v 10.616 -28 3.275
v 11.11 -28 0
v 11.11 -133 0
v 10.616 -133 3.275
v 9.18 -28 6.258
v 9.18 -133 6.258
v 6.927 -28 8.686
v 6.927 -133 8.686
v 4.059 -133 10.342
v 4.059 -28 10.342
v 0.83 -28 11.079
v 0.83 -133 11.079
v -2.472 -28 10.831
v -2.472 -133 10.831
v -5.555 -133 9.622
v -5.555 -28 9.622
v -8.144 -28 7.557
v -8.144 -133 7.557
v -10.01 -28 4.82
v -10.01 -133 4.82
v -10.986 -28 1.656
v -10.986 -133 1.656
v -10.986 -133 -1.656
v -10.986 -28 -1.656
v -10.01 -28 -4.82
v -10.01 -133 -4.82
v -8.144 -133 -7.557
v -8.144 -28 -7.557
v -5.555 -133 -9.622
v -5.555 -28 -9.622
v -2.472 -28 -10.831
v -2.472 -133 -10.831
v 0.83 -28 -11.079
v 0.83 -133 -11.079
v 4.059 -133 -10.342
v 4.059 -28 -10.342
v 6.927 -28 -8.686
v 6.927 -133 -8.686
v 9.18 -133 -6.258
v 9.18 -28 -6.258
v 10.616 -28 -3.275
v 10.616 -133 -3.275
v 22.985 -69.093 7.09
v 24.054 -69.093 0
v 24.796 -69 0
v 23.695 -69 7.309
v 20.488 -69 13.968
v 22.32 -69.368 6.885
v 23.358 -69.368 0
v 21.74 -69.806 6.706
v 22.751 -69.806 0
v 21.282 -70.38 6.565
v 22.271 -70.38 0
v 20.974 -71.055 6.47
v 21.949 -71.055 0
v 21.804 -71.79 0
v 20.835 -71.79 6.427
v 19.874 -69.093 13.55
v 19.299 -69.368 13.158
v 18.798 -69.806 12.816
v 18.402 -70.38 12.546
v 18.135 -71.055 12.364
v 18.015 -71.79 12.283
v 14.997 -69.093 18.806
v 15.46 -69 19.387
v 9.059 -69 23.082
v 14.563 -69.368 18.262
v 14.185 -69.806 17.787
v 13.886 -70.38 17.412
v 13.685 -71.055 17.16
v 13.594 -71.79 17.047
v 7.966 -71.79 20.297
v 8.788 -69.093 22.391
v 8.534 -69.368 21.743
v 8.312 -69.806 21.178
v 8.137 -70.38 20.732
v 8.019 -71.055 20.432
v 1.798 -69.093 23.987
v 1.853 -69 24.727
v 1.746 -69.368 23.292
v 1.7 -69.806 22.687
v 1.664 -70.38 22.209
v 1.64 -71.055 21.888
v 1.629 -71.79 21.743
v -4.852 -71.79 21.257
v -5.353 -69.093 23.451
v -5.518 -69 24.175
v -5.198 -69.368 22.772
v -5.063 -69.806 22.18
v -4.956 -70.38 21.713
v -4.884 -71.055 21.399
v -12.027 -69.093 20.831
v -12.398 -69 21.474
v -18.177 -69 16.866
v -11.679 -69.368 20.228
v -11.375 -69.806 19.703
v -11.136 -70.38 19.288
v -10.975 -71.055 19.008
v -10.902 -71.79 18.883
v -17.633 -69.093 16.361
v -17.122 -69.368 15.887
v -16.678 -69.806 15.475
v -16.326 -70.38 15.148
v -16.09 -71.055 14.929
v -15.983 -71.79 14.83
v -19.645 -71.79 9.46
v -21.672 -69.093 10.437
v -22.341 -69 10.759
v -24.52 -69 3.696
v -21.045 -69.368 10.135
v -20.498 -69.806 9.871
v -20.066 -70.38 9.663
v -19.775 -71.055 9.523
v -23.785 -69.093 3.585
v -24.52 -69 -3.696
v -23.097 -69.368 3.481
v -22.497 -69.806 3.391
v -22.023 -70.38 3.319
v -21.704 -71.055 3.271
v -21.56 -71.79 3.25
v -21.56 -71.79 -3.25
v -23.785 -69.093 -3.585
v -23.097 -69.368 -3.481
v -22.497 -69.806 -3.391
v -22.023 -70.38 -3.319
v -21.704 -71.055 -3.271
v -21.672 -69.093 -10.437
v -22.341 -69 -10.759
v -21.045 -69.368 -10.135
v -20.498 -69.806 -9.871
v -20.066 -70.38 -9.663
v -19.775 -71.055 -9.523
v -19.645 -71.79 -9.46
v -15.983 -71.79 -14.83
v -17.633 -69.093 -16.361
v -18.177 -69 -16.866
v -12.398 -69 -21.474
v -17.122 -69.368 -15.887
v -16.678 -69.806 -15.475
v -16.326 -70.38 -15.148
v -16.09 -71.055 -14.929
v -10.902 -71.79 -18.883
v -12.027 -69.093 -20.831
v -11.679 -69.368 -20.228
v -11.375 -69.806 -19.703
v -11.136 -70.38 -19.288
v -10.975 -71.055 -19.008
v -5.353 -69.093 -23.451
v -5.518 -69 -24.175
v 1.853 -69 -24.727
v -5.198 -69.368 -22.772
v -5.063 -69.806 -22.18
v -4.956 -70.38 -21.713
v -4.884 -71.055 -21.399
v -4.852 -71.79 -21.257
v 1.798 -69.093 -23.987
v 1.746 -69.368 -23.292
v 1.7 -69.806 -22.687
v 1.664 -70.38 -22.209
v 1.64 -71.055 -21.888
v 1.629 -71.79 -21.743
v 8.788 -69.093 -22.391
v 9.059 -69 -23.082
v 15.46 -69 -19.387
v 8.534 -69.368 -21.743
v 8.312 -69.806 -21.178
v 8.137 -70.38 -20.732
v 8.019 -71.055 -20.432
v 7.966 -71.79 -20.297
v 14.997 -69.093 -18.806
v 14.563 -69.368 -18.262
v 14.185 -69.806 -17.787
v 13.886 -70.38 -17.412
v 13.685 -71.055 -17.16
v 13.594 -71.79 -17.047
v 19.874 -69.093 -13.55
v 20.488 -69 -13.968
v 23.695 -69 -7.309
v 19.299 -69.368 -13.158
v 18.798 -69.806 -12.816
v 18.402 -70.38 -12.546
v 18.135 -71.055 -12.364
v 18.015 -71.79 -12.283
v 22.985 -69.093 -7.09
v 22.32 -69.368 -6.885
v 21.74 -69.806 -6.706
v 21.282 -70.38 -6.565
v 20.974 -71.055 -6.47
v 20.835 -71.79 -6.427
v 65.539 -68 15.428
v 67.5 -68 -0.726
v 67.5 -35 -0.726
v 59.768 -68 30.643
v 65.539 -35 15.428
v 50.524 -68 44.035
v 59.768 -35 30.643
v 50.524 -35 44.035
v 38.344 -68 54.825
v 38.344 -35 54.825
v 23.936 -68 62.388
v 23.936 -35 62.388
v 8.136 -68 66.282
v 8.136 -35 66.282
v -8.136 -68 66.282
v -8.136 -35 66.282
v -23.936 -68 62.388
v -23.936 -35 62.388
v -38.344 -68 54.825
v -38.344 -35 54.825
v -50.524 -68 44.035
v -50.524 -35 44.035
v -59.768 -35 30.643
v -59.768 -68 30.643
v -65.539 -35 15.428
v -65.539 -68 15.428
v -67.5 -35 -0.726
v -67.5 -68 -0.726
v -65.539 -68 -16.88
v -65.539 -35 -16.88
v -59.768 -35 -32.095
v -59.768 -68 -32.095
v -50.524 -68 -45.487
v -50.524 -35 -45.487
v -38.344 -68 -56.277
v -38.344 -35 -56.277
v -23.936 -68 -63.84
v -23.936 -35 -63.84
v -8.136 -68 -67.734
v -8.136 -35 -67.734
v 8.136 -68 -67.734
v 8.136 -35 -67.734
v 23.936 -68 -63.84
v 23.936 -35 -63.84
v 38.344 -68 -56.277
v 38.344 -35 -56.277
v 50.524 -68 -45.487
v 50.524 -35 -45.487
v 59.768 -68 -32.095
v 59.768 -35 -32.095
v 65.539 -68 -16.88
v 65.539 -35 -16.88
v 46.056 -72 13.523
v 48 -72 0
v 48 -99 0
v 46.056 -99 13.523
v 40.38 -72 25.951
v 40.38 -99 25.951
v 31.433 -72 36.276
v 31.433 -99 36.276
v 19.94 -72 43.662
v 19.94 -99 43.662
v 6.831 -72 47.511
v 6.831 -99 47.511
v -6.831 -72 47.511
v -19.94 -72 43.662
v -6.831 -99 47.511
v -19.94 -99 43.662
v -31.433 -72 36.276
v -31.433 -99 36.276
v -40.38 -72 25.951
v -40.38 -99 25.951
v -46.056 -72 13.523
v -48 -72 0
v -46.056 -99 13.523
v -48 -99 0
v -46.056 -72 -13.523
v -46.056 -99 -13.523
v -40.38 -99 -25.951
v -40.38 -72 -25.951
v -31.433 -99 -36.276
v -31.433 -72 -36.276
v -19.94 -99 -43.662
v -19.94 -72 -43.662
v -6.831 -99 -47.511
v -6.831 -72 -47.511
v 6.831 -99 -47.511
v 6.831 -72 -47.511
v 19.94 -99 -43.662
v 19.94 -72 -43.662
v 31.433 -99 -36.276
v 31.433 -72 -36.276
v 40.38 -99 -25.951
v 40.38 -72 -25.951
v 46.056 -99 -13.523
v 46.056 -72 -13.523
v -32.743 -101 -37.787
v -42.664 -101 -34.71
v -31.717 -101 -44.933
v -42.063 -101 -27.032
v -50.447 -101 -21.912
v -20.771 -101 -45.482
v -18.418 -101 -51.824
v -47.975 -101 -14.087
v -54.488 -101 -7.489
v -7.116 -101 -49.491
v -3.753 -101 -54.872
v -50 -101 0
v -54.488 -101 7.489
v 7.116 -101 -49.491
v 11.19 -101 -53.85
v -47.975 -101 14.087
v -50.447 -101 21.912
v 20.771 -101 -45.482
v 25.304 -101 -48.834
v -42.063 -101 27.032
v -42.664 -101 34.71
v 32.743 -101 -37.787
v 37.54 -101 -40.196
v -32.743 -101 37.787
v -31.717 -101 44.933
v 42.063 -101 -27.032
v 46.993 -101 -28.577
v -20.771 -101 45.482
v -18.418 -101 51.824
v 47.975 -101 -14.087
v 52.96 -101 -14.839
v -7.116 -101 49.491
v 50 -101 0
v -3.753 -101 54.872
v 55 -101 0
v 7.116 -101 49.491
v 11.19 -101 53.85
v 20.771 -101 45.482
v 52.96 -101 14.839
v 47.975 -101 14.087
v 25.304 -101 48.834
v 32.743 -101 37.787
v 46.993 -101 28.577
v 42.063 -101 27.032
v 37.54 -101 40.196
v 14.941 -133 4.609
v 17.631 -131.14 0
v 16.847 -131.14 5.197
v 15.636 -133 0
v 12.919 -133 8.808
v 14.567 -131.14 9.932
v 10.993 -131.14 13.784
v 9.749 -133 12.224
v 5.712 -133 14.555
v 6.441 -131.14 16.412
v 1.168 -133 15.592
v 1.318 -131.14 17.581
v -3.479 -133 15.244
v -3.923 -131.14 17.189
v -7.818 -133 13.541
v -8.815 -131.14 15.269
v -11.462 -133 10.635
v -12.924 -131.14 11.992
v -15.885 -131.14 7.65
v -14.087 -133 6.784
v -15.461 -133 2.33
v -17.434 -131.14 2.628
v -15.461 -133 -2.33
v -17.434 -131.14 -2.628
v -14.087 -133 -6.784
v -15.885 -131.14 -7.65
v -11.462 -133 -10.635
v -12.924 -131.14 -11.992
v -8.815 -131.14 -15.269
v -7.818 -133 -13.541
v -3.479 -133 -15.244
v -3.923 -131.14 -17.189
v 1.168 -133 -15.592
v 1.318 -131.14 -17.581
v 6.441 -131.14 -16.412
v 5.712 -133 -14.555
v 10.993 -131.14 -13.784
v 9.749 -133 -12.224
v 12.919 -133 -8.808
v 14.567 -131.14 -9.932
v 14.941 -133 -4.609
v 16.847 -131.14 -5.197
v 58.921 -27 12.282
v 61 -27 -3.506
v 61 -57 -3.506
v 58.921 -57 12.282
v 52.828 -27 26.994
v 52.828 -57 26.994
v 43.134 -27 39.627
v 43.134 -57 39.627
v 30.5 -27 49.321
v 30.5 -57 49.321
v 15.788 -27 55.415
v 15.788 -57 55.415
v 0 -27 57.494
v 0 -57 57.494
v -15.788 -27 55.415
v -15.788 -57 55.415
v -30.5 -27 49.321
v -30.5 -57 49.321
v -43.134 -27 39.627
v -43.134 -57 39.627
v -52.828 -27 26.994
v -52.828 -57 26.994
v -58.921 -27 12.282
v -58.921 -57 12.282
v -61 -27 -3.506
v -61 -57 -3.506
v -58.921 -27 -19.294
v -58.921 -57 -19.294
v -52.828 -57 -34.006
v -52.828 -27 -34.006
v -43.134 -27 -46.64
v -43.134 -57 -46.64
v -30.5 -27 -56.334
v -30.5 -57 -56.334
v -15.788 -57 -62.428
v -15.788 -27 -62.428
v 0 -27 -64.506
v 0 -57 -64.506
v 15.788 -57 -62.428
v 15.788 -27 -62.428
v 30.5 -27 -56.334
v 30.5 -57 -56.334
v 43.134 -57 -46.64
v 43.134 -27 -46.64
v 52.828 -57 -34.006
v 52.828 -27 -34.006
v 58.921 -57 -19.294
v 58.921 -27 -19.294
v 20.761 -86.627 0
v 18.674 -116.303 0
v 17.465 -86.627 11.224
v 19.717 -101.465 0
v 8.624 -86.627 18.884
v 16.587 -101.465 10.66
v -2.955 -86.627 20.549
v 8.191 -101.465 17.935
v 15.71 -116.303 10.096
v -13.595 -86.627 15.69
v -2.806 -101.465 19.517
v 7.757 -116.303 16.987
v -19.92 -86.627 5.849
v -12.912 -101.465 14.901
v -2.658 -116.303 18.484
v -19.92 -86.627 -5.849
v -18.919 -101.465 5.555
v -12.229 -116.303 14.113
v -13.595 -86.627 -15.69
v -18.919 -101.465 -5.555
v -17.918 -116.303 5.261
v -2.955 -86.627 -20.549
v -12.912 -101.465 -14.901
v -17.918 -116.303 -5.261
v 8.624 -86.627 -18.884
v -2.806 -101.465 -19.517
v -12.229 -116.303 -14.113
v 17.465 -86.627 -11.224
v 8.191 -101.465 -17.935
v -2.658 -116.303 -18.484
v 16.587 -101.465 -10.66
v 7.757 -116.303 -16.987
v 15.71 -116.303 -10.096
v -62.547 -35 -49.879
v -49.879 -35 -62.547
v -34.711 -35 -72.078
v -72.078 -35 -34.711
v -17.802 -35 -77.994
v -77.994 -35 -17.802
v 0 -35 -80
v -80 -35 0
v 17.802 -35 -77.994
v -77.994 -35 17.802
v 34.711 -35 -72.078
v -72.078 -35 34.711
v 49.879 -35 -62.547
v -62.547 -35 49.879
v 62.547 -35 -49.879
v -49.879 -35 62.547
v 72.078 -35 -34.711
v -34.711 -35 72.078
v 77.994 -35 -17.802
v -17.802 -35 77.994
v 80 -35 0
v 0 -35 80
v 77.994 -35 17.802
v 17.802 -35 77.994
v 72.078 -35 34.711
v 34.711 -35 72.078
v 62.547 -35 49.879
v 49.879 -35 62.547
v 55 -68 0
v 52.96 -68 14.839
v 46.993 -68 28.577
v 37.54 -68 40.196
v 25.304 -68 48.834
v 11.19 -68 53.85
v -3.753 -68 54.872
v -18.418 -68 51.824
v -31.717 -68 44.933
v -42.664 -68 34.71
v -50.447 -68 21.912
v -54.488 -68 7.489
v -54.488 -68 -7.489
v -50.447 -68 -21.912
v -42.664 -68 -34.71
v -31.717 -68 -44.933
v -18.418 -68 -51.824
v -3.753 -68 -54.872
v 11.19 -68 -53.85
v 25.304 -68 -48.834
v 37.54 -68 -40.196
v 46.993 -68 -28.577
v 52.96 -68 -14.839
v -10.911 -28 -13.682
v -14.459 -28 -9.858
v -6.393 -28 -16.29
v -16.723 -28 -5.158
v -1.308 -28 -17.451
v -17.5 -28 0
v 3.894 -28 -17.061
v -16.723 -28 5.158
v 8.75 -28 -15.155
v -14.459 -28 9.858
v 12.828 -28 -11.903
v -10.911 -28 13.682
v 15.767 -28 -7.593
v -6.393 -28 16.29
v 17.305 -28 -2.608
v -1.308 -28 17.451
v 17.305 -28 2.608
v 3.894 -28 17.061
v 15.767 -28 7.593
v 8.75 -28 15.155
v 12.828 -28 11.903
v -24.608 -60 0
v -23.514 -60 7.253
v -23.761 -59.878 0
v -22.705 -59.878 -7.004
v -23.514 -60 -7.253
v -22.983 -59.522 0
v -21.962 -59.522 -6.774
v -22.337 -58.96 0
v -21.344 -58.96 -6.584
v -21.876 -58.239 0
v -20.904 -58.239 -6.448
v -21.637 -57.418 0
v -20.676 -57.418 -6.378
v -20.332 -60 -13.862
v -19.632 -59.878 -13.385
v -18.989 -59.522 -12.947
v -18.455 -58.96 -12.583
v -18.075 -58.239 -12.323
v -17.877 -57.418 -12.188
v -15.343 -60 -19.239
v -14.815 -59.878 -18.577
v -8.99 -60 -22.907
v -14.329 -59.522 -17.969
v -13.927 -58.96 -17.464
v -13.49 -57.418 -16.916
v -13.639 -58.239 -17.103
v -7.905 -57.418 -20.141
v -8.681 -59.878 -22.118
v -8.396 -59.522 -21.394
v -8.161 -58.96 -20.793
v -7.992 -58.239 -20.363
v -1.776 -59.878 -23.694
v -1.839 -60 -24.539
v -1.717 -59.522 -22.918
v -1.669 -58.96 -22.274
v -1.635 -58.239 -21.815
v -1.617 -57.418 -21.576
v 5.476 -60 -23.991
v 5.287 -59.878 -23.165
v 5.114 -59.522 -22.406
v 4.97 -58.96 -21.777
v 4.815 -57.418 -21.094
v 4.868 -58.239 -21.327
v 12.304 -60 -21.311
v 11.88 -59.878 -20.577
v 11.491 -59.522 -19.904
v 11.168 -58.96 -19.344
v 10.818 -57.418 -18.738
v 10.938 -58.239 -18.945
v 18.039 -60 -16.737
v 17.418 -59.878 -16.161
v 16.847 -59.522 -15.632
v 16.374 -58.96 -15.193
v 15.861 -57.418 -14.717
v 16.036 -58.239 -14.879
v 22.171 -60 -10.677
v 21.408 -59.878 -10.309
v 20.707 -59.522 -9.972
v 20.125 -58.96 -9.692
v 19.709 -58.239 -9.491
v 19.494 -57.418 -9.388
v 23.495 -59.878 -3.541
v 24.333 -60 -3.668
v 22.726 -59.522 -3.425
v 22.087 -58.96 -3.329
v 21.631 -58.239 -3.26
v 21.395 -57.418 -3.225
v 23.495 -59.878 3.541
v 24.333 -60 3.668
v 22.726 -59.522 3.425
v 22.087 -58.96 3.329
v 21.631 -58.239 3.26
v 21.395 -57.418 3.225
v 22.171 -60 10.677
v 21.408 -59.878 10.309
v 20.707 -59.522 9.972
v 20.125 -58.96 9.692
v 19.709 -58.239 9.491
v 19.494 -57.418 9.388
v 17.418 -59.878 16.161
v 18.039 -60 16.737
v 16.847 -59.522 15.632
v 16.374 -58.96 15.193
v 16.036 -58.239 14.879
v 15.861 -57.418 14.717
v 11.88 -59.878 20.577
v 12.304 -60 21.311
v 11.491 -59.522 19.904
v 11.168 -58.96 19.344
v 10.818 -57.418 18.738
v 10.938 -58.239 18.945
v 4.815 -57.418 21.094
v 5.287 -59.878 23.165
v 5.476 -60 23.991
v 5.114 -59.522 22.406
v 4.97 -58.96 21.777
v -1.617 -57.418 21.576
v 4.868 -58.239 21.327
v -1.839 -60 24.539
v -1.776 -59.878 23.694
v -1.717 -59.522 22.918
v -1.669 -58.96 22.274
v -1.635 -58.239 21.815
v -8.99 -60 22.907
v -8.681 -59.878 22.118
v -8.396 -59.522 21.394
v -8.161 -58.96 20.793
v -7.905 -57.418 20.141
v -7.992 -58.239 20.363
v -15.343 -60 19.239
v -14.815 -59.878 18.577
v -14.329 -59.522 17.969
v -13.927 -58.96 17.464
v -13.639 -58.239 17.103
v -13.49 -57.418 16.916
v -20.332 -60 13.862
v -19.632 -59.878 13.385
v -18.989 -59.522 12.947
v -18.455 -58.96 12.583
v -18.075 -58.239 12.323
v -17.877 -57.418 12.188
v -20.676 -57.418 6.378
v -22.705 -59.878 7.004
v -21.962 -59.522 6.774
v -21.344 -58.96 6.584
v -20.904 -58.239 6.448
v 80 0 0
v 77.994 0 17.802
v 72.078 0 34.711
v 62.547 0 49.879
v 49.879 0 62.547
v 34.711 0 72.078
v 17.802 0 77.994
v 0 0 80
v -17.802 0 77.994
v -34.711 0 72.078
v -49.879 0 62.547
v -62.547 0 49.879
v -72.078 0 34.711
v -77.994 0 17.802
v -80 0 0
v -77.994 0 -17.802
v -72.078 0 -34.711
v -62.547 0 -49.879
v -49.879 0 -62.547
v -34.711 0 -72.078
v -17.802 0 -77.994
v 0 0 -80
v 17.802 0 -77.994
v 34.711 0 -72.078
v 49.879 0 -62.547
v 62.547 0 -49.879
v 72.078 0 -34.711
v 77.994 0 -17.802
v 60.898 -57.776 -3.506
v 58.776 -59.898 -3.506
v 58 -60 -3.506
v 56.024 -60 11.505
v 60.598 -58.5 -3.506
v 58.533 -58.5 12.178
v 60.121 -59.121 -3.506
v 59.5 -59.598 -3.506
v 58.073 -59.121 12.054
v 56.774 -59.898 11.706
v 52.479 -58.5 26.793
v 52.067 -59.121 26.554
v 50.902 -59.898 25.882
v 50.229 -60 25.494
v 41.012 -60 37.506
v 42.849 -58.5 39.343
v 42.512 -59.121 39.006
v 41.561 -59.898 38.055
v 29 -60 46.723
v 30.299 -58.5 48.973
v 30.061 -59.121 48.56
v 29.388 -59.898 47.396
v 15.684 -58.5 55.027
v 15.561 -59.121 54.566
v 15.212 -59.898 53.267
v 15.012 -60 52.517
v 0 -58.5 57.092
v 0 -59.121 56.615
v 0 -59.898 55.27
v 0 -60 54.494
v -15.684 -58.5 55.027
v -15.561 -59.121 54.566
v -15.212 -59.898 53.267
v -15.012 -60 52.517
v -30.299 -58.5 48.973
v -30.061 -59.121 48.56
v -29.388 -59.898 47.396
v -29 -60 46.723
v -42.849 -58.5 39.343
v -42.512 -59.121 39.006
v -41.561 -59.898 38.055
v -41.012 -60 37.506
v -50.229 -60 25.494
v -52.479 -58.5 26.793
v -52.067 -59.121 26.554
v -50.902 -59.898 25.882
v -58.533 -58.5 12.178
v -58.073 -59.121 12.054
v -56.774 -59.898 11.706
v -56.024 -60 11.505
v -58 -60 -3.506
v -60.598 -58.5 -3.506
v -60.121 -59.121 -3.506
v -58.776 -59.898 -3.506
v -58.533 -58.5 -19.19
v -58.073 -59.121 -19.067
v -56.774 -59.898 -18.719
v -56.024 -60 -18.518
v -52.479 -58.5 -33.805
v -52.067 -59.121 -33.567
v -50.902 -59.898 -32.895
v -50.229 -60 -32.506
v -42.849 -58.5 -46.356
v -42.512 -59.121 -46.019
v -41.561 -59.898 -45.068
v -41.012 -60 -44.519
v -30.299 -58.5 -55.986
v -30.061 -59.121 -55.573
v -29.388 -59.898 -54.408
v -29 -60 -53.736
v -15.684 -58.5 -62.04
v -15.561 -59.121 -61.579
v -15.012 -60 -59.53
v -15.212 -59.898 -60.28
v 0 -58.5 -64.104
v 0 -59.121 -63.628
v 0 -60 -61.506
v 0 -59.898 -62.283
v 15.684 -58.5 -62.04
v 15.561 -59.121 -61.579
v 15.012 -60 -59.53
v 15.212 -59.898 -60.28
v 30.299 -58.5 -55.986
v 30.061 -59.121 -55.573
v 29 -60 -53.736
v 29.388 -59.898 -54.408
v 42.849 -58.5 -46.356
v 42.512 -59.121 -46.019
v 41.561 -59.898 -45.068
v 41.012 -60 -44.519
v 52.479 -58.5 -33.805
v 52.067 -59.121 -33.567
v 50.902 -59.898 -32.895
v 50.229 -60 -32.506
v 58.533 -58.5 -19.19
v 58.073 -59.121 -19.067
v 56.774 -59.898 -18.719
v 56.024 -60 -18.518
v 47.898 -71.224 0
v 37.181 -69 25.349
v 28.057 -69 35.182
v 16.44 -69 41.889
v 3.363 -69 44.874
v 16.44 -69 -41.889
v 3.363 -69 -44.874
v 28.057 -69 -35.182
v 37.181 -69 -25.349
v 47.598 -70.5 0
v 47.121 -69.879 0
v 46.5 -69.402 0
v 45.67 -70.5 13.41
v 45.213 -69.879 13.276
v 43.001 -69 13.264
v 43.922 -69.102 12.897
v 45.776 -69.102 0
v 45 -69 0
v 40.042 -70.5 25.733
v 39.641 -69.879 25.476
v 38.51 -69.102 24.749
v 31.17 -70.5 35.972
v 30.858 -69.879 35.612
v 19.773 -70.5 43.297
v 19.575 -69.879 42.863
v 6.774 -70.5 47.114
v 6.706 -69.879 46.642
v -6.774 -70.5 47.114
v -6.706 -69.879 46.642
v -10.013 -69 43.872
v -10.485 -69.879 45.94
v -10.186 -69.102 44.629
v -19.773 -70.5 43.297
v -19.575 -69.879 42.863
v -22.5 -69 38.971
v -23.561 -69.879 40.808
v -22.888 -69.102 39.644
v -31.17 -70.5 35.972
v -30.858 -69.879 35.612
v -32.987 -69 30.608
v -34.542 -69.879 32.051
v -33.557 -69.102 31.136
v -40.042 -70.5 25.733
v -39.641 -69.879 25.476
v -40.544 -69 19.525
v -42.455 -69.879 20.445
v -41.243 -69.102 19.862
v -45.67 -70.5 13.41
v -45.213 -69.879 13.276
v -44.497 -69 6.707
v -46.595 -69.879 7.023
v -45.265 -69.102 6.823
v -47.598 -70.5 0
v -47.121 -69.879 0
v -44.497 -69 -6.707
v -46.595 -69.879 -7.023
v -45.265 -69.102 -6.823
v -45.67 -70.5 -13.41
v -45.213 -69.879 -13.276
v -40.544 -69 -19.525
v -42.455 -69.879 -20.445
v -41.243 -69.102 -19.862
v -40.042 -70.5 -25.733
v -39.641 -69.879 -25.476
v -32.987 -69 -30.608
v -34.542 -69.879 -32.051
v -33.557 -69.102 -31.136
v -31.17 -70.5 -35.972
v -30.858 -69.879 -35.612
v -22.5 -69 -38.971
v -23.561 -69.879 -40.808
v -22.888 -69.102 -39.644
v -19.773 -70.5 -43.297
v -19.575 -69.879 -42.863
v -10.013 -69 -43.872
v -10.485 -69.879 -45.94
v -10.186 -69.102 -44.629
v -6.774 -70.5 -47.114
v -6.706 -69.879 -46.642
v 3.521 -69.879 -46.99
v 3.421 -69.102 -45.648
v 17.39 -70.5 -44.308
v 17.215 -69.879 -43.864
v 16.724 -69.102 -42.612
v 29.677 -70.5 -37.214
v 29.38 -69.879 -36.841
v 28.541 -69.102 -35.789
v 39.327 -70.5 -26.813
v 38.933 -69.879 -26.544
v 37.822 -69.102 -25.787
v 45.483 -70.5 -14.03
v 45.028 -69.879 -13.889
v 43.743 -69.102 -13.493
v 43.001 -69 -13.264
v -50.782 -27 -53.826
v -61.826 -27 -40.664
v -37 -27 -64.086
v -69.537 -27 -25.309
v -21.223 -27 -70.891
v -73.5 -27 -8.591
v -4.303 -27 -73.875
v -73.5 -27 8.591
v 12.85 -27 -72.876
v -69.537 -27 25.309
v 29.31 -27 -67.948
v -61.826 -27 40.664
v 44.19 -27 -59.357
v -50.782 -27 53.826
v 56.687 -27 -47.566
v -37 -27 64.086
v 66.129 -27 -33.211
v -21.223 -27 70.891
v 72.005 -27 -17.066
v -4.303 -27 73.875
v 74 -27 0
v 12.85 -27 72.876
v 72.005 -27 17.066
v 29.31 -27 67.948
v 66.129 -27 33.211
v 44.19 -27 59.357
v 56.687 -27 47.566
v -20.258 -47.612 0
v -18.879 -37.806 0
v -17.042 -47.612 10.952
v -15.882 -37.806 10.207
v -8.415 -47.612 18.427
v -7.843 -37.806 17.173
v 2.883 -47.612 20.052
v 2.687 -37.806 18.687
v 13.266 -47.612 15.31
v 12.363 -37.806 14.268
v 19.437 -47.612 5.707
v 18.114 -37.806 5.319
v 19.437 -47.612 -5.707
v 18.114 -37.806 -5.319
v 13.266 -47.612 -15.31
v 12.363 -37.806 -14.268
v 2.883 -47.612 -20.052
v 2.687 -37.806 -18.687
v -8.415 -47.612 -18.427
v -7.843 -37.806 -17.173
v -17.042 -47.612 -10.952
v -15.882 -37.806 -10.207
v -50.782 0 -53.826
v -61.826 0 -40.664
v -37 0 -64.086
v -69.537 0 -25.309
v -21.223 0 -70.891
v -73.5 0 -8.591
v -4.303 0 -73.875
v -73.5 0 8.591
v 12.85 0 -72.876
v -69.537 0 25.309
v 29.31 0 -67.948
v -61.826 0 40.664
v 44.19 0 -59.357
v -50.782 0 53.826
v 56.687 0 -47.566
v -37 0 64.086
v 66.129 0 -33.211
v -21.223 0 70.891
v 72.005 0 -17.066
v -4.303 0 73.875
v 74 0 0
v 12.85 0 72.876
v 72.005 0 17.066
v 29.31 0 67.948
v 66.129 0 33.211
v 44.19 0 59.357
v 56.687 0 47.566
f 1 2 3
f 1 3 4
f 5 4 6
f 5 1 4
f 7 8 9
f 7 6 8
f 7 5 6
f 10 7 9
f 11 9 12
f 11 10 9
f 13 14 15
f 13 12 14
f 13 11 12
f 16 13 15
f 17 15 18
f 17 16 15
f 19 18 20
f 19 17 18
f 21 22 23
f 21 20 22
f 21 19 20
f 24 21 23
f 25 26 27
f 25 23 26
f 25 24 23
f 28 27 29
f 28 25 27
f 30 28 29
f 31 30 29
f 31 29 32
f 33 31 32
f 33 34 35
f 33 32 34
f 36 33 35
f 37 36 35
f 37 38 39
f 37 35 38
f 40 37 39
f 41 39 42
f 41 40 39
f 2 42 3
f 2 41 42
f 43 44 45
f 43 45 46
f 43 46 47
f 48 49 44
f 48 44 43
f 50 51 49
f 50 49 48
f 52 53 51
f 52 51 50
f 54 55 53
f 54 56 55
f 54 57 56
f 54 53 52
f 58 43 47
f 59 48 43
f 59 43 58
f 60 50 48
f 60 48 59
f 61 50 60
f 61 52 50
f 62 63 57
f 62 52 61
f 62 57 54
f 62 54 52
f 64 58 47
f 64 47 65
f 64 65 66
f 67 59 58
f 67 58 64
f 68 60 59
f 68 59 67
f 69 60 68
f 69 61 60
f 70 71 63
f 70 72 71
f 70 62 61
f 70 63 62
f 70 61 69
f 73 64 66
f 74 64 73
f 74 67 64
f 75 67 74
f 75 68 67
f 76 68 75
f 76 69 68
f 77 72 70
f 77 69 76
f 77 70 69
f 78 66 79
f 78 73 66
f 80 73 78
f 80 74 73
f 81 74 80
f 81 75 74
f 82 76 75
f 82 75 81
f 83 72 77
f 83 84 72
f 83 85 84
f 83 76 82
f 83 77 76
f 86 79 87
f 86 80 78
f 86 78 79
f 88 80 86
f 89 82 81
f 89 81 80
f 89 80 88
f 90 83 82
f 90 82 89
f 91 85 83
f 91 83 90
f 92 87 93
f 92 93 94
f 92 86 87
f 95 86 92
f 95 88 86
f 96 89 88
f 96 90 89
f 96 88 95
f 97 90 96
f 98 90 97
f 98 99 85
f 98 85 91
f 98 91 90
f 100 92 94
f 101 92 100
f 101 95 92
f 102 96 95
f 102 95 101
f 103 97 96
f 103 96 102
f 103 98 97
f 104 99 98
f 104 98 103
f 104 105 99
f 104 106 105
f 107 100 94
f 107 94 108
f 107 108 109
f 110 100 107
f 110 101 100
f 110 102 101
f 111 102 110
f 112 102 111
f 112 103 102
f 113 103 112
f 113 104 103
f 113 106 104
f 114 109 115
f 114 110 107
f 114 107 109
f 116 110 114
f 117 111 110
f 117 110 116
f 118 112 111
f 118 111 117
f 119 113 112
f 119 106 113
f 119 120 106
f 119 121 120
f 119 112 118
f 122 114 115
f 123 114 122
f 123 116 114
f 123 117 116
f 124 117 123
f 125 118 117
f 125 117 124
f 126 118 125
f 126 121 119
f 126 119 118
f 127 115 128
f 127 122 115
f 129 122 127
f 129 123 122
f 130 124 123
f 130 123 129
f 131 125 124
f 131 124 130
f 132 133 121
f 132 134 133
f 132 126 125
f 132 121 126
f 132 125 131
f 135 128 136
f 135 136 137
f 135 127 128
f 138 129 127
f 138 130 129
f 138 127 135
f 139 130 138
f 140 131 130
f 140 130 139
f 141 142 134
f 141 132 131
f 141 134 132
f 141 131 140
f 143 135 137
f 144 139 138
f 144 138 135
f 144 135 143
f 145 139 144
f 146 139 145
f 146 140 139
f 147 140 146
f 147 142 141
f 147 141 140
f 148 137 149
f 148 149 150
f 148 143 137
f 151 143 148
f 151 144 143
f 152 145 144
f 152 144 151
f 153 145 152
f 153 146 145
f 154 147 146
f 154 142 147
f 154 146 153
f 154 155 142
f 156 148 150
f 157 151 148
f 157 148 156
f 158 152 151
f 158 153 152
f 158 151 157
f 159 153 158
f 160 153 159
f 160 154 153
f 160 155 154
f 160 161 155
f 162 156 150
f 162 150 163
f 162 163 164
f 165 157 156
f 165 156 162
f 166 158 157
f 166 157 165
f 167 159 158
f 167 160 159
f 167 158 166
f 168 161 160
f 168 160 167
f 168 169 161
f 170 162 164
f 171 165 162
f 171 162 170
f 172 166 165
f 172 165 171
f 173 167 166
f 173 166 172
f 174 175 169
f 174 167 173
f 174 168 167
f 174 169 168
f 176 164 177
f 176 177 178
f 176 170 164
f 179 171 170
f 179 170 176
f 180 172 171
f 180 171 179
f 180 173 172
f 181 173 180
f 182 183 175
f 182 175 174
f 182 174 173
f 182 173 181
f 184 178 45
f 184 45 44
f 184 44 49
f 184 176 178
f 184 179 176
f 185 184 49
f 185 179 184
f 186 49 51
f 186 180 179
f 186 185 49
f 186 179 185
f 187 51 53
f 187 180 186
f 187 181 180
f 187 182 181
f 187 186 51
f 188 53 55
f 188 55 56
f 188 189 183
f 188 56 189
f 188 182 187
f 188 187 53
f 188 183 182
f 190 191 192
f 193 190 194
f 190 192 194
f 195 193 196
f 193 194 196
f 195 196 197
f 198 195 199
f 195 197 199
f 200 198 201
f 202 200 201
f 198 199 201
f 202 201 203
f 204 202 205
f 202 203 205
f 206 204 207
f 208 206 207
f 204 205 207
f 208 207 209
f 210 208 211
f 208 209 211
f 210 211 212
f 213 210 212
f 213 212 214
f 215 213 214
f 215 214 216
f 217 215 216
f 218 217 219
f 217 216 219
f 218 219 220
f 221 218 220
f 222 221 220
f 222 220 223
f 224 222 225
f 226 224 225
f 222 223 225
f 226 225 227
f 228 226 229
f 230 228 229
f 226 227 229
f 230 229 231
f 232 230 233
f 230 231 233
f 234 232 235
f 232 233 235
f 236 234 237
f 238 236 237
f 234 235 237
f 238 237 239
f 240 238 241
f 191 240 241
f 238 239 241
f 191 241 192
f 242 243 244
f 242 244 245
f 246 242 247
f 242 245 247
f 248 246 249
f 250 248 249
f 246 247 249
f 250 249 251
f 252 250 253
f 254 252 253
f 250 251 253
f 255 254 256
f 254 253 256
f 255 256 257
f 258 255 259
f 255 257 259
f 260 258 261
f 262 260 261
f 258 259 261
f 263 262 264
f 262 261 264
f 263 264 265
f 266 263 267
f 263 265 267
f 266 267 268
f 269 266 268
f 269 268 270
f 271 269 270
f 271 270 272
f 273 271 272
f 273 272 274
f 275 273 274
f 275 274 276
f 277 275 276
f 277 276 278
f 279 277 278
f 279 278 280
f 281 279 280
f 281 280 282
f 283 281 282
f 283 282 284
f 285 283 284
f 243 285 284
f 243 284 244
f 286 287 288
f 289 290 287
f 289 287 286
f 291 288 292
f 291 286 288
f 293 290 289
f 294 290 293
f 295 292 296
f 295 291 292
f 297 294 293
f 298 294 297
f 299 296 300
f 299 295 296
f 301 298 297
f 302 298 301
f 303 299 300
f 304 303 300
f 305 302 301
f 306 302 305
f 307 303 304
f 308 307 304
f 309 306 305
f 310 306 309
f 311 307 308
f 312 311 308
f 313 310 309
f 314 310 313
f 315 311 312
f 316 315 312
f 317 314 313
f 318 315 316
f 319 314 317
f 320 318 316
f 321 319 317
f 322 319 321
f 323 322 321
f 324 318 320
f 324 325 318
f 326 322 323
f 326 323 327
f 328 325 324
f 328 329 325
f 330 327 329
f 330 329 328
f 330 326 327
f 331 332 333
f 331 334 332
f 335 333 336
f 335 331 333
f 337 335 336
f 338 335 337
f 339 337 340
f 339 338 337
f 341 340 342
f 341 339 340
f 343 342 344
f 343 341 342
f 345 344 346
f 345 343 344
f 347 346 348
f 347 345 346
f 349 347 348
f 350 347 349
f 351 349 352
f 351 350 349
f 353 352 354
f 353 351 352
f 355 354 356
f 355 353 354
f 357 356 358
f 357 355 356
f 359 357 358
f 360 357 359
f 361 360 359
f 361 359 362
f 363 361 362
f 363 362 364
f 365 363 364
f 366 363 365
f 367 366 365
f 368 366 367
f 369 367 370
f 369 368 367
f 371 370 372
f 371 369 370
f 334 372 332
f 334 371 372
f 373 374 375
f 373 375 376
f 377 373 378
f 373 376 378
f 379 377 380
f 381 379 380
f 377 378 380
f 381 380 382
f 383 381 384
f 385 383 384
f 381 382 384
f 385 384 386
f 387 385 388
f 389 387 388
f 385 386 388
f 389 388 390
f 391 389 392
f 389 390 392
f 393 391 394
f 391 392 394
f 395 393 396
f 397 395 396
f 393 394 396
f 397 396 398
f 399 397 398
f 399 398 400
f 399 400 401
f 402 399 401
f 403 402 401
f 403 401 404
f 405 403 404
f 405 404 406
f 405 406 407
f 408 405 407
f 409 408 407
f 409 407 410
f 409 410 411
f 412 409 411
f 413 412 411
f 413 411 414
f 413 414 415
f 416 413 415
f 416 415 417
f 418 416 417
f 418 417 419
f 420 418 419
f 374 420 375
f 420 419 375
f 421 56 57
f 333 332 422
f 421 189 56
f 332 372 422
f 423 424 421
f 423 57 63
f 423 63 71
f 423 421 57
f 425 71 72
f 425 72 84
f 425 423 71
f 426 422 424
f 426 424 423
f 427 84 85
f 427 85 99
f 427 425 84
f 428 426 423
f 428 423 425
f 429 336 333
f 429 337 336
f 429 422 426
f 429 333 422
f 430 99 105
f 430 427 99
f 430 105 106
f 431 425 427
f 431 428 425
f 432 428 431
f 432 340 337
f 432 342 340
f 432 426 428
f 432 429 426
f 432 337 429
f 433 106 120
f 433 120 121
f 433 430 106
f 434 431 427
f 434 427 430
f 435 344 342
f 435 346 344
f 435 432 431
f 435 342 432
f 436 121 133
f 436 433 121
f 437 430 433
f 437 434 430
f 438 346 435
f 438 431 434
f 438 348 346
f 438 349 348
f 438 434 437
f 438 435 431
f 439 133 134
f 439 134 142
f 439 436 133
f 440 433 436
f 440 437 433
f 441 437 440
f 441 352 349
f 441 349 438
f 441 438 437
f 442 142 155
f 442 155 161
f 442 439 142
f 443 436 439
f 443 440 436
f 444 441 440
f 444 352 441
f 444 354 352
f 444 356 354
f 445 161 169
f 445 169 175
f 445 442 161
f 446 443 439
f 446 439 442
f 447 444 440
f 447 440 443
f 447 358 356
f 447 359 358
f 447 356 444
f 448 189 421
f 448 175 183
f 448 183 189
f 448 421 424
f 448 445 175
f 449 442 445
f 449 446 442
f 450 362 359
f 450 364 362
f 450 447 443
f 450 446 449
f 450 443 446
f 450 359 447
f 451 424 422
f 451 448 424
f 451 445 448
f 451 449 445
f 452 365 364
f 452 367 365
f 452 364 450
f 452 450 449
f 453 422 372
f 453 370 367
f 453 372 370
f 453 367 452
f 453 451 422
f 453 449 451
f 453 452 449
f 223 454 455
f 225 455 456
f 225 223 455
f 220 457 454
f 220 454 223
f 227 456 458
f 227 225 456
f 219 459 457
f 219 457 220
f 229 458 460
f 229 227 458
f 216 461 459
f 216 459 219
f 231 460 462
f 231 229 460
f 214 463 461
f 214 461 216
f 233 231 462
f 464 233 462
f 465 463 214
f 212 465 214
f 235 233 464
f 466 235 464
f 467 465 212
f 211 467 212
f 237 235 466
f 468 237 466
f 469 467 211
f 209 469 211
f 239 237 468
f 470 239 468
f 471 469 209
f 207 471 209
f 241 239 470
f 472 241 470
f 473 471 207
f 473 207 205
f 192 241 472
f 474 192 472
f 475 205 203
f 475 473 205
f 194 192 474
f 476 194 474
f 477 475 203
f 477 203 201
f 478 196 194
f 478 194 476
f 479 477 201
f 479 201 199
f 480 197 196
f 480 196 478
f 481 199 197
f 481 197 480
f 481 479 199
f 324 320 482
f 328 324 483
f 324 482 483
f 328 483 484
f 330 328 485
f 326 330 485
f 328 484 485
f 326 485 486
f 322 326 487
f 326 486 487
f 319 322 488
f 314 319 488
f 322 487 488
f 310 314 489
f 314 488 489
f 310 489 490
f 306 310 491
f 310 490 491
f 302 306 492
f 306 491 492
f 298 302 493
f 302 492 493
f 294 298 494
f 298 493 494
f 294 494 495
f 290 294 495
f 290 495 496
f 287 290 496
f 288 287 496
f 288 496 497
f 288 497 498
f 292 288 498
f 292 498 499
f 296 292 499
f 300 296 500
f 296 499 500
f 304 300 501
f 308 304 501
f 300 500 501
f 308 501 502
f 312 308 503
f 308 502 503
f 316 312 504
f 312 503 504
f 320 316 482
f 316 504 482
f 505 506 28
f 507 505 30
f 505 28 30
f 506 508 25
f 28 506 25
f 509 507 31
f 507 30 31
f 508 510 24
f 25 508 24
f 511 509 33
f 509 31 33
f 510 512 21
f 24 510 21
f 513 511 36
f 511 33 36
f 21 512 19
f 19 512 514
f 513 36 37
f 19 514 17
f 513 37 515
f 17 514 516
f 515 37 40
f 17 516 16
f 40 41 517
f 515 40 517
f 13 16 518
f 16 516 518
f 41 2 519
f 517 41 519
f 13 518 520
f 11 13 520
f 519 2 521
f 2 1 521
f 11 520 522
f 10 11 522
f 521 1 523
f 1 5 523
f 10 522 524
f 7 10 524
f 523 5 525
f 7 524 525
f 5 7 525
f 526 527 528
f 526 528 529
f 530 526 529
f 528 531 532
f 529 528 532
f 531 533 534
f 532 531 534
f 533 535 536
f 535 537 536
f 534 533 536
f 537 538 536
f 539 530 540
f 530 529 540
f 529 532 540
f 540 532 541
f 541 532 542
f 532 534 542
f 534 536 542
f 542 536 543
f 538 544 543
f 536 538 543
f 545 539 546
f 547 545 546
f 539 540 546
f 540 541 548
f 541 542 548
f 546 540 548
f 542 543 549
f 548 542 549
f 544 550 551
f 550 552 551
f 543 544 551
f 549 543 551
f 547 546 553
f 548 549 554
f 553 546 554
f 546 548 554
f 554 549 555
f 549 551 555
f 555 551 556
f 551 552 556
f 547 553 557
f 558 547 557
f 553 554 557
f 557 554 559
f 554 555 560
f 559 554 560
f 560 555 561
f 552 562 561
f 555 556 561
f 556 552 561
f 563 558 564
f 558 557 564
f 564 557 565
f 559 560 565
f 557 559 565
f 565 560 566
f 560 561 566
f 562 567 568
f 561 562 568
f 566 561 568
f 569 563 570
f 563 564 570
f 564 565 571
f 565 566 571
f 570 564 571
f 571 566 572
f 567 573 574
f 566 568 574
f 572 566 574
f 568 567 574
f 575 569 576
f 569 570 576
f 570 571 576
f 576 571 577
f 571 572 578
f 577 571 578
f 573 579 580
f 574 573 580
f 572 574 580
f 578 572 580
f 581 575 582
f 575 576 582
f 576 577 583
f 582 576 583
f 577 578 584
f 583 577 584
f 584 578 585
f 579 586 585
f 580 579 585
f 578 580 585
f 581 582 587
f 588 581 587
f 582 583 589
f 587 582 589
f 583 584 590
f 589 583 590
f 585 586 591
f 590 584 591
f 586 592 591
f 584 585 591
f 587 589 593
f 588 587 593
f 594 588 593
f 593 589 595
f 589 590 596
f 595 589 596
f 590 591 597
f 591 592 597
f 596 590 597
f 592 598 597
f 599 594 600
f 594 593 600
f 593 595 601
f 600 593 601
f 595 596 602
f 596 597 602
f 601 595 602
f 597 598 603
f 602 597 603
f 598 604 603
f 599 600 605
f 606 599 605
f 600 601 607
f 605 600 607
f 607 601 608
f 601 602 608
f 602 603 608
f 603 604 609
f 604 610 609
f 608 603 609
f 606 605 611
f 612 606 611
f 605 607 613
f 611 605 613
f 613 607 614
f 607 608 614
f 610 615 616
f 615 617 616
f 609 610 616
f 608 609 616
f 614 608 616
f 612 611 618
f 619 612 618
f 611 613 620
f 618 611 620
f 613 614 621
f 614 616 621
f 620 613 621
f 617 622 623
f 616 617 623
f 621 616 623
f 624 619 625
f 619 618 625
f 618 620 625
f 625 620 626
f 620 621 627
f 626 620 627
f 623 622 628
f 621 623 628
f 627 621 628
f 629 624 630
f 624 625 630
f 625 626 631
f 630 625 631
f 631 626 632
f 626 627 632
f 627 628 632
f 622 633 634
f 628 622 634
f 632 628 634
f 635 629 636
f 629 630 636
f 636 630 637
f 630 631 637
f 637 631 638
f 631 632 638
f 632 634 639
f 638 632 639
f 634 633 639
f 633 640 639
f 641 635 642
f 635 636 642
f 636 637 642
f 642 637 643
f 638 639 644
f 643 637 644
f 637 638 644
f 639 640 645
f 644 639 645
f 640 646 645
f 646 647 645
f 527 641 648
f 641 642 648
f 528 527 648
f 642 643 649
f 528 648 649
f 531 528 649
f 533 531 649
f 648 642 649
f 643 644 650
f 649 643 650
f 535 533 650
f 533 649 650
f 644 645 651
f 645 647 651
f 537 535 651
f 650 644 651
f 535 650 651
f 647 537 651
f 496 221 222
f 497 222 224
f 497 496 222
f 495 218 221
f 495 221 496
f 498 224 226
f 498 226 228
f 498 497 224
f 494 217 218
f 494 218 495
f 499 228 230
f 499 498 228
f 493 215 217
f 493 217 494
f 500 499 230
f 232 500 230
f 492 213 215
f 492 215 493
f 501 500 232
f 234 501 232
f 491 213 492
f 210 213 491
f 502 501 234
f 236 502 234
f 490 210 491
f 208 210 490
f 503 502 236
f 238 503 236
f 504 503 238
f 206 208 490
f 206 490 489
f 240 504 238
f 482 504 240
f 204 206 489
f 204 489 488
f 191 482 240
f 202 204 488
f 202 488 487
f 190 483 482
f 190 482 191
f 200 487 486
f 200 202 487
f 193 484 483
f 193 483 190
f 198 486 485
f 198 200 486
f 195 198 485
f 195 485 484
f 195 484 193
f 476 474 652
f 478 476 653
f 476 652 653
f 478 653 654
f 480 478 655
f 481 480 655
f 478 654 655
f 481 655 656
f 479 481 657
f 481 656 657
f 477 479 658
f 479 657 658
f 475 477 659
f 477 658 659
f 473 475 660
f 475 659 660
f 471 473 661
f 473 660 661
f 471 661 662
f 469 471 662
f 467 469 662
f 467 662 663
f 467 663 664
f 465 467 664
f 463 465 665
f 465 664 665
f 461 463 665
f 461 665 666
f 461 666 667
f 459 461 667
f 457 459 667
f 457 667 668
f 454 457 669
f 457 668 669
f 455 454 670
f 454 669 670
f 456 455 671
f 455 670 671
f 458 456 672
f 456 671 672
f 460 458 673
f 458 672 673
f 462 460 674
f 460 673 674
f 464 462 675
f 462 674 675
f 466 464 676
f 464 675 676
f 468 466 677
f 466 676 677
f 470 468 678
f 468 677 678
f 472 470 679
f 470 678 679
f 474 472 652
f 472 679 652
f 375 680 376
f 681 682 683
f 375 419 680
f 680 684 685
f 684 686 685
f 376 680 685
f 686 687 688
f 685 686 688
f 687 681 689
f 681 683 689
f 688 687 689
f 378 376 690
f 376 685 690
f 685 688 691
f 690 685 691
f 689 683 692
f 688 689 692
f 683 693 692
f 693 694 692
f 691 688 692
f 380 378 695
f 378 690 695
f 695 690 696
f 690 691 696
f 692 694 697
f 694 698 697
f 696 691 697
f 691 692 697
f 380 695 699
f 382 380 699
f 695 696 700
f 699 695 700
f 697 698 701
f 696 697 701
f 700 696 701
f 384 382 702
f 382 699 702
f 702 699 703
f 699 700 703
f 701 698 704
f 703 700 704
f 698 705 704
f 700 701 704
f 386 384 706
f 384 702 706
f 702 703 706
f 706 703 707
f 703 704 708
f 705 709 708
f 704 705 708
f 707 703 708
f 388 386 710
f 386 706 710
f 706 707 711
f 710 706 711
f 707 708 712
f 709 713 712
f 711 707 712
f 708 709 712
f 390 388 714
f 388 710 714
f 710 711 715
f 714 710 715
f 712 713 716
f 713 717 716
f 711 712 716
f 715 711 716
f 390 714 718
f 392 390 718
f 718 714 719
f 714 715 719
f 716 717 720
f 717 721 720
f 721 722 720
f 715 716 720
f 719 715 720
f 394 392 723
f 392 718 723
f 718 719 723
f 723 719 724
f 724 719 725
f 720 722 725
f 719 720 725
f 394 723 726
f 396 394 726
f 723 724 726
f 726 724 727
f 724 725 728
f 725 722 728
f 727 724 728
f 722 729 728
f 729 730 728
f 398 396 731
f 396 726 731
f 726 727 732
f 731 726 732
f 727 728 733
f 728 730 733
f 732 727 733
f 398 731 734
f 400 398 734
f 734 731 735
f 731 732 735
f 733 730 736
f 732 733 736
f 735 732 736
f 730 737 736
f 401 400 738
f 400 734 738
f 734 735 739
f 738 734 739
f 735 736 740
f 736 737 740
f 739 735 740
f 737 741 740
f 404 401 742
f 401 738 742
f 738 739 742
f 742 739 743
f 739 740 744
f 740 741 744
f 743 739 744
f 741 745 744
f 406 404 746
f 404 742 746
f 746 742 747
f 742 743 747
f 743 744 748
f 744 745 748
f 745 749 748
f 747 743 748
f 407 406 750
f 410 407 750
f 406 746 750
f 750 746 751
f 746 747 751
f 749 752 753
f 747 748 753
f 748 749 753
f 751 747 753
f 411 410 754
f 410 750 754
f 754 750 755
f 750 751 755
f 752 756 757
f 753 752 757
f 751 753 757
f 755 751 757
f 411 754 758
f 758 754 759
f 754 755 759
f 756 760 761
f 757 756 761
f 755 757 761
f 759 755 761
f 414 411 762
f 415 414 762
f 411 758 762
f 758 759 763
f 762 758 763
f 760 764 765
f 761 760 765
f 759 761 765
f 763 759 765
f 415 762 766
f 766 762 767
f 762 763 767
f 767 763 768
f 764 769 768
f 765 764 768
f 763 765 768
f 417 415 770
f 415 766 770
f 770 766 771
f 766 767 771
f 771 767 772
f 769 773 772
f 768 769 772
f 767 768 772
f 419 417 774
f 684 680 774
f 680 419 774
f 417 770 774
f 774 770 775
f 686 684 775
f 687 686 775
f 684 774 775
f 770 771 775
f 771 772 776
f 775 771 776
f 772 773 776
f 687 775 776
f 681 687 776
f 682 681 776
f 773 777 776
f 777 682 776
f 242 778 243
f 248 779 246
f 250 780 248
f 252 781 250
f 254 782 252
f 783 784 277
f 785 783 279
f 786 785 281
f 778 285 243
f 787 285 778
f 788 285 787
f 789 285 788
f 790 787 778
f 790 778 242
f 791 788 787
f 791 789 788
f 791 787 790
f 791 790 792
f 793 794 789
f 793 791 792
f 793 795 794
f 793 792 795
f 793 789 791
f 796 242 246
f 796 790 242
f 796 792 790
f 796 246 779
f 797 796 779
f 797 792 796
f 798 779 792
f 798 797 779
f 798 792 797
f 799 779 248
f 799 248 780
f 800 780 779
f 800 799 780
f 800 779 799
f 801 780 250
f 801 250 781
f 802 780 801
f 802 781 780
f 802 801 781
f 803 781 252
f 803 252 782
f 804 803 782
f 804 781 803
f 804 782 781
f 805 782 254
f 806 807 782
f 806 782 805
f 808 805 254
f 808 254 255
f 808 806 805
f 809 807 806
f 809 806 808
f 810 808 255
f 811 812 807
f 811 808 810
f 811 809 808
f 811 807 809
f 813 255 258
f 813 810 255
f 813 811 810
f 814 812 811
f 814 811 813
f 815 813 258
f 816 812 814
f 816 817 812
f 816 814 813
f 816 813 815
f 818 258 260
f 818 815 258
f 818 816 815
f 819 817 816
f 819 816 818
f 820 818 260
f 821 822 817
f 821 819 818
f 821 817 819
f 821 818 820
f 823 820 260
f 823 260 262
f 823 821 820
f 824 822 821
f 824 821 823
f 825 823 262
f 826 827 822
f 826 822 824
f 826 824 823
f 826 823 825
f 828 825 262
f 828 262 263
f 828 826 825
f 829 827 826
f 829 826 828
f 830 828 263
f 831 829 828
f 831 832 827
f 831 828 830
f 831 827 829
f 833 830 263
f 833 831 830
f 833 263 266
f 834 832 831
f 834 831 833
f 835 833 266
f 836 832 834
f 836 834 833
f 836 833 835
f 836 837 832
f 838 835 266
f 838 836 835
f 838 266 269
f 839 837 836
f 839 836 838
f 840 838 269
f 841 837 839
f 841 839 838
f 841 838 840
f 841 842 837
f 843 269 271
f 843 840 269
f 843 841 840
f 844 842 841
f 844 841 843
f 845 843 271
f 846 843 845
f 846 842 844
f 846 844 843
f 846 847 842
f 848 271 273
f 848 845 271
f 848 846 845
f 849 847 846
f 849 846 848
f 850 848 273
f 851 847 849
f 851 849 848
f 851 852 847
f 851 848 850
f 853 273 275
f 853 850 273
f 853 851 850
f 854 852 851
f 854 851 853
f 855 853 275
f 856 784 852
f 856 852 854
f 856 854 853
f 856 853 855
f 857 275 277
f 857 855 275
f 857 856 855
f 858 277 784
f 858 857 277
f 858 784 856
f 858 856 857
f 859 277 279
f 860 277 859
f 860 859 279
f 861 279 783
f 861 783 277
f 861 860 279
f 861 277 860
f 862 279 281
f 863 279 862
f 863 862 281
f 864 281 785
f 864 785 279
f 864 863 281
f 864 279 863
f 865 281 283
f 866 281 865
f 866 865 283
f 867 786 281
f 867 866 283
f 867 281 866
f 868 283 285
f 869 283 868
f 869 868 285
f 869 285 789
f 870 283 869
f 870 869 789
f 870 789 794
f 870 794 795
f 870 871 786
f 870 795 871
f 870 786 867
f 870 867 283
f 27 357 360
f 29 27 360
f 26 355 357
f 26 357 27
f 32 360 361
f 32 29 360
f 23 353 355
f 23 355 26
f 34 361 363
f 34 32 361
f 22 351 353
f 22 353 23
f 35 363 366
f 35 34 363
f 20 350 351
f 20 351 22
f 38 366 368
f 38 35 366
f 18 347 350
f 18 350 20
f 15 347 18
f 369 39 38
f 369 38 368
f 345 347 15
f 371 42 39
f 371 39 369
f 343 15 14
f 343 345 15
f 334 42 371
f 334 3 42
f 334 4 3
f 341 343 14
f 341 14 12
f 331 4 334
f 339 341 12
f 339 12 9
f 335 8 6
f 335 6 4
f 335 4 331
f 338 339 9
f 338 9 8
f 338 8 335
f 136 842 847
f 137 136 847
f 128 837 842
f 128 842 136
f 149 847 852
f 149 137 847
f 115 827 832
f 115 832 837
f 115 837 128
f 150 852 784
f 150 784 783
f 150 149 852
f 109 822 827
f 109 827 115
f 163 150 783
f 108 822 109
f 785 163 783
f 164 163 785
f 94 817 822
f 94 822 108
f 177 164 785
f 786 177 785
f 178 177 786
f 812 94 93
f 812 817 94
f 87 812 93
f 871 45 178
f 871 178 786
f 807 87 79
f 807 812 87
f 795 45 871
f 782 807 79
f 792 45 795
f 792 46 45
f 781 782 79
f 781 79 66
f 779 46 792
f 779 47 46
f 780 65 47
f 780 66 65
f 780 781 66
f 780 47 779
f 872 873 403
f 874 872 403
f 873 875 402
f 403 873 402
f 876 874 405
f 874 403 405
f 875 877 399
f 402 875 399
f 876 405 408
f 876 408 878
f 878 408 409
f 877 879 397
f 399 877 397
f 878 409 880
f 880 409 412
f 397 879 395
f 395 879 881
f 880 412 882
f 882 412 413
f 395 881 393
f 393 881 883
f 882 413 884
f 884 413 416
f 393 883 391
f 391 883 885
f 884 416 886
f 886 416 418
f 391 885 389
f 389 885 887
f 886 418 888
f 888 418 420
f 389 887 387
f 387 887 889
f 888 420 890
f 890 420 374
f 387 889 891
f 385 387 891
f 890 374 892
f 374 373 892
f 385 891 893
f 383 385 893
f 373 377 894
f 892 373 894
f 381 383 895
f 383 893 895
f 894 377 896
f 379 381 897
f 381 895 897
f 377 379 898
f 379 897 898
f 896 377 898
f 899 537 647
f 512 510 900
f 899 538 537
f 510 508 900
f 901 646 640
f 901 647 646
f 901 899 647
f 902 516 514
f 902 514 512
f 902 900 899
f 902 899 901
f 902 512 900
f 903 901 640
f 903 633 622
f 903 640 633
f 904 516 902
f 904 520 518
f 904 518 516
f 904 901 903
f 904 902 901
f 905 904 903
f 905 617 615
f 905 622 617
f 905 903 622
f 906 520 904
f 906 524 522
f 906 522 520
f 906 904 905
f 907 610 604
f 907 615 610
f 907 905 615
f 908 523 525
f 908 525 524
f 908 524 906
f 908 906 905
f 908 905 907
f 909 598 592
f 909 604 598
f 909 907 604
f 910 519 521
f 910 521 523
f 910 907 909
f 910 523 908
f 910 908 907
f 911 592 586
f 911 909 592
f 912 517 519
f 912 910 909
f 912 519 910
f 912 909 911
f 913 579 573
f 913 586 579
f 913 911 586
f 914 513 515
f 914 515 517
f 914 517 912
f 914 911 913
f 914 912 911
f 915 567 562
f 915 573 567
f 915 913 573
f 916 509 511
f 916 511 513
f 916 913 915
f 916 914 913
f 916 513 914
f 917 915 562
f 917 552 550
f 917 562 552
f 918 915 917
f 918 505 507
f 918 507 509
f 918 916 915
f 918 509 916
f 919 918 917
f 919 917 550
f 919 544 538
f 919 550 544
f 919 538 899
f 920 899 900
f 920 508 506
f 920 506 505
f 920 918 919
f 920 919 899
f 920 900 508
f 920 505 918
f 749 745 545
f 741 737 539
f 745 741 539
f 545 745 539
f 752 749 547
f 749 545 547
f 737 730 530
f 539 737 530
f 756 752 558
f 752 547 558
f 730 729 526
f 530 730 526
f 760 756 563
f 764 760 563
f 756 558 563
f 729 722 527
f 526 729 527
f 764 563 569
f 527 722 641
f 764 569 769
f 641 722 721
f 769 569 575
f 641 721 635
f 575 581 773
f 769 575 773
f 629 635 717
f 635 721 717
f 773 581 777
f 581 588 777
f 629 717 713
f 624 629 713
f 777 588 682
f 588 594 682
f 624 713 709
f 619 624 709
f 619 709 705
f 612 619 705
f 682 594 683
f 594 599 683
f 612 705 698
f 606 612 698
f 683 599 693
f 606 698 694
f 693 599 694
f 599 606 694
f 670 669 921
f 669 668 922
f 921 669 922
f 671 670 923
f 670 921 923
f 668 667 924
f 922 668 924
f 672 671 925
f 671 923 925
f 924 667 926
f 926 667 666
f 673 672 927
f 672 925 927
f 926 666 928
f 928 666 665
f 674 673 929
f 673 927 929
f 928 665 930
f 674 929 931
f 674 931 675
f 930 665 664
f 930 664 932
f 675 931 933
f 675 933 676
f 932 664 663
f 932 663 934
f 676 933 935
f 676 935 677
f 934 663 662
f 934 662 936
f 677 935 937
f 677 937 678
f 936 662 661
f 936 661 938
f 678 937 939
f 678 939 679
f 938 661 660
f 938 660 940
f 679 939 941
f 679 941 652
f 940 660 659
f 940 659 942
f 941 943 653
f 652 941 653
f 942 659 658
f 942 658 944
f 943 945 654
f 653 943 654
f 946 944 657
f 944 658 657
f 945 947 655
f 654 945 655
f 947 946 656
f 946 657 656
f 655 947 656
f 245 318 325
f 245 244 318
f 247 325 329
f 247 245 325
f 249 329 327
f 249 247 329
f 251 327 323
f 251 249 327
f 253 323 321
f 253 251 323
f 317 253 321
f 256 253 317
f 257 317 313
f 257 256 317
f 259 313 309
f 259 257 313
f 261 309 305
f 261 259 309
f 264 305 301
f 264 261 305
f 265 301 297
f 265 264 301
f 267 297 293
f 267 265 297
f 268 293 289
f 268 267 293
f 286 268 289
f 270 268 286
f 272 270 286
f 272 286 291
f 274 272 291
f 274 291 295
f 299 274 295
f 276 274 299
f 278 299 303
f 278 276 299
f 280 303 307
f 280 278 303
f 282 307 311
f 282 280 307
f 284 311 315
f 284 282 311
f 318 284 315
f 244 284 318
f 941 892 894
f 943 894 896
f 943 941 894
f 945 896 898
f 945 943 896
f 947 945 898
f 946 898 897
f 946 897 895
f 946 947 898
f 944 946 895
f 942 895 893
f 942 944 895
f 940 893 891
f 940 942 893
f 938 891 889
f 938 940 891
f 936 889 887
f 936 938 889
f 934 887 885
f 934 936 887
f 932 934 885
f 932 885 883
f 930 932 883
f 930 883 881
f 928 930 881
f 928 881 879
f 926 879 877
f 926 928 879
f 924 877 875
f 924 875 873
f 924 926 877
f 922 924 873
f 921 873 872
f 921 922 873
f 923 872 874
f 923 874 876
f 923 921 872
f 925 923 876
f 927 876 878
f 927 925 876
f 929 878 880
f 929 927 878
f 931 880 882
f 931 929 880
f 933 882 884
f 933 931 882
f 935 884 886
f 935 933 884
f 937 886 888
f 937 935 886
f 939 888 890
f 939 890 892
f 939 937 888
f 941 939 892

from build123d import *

# Parameters (mm, degrees)
F3_R      = 80
F4_DEPTH  = 35
F5_R      = 67.5
F6_DEPTH  = 33
F7_R      = 55
F8_DEPTH  = 33
F9_R      = 48
F10_DEPTH = 64
F11_R     = 22
F12_R     = 17.5
F14_R     = 74
F15_DEPTH = 27
F16_R     = 61
F17_DEPTH = 60.001
F18_R     = 22
F19_R     = 17.5
F21_R     = 11.11
F22_DEPTH = 133.0010001
F24_R     = 3


# Not quite as in the source:
# - a fillet or chamfer that OpenCascade refuses, or shapes differently, is made with other operations: its cross-section is extruded or revolved along the edge and cut away or added


with BuildPart() as f4:
    # F3 (on Front) → F4 (new body)
    with BuildSketch(Plane.XZ):
        Circle(F3_R)
    extrude(amount=F4_DEPTH)

    # F5 (on face) → F6 (join)
    with BuildSketch(Plane.XZ.offset(35)):
        with Locations((-1.0126e-06, -0.7260435959)):
            Circle(F5_R)
    extrude(amount=F6_DEPTH)

    # F7 (on face) → F8 (join)
    with BuildSketch(Plane.XZ.offset(68)):
        Circle(F7_R)
    extrude(amount=F8_DEPTH)

    # F9 (on offset) → F10 (cut)
    with BuildSketch(Plane.XZ.offset(133)):
        Circle(F9_R)
    extrude(amount=-F10_DEPTH, mode=Mode.SUBTRACT)

    # F11 (on face) → F13 section 0
    with BuildSketch(Plane.XZ.offset(69)):
        Circle(F11_R)
    # F12 (on offset) → F13 section 1
    with BuildSketch(Plane.XZ.offset(133)):
        Circle(F12_R)
    loft()

    # F14 (on Front) → F15 (cut)
    with BuildSketch(Plane.XZ):
        Circle(F14_R)
    extrude(amount=F15_DEPTH, mode=Mode.SUBTRACT)

    # F16 (on offset) → F17 (cut, through all)
    with BuildSketch(Plane.XZ.offset(60)):
        with Locations((0, -3.5063521937)):
            Circle(F16_R)
    extrude(amount=-F17_DEPTH, mode=Mode.SUBTRACT)

    # F18 (on face) → F20 section 0
    with BuildSketch(Plane(origin=(0, -60, 0), x_dir=(-1, 0, 0), z_dir=(0, 1, 0))):
        Circle(F18_R)
    # F19 (on offset) → F20 section 1
    with BuildSketch(Plane.XZ.offset(28)):
        Circle(F19_R)
    loft()

    # F21 (on Front) → F22 (cut, through all)
    with BuildSketch(Plane.XZ):
        Circle(F21_R)
    extrude(amount=F22_DEPTH, mode=Mode.SUBTRACT)

    # F23: chamfer of 2 on 2 edges, made by hand

    # F23_s1 → F23_t2 (revolve, cut)
    with BuildSketch(Plane.XY):
        Polygon((50, -101), (48, -99), (48, -101), align=None)
    revolve(axis=Axis((0, -101, 0), (0, -1, 0)), mode=Mode.SUBTRACT)

    # F23_s3 → F23_t4 (revolve, cut)
    with BuildSketch(Plane.XY):
        Polygon((17.6307616561, -131.1402786693), (15.6356872477, -133), (17.5, -133), align=None)
    revolve(axis=Axis((0, -133, 0), (0, -1, 0)), mode=Mode.SUBTRACT)

    # F24
    f24_edges = [f4.edges().sort_by_distance(p)[0] for p in [
        (-22, -69, 0),
        (-48, -69, 0),
        (-61, -60, -3.506352),
        (22, -60, 0),
    ]]
    fillet(f24_edges, radius=F24_R)


solid = f4.part
